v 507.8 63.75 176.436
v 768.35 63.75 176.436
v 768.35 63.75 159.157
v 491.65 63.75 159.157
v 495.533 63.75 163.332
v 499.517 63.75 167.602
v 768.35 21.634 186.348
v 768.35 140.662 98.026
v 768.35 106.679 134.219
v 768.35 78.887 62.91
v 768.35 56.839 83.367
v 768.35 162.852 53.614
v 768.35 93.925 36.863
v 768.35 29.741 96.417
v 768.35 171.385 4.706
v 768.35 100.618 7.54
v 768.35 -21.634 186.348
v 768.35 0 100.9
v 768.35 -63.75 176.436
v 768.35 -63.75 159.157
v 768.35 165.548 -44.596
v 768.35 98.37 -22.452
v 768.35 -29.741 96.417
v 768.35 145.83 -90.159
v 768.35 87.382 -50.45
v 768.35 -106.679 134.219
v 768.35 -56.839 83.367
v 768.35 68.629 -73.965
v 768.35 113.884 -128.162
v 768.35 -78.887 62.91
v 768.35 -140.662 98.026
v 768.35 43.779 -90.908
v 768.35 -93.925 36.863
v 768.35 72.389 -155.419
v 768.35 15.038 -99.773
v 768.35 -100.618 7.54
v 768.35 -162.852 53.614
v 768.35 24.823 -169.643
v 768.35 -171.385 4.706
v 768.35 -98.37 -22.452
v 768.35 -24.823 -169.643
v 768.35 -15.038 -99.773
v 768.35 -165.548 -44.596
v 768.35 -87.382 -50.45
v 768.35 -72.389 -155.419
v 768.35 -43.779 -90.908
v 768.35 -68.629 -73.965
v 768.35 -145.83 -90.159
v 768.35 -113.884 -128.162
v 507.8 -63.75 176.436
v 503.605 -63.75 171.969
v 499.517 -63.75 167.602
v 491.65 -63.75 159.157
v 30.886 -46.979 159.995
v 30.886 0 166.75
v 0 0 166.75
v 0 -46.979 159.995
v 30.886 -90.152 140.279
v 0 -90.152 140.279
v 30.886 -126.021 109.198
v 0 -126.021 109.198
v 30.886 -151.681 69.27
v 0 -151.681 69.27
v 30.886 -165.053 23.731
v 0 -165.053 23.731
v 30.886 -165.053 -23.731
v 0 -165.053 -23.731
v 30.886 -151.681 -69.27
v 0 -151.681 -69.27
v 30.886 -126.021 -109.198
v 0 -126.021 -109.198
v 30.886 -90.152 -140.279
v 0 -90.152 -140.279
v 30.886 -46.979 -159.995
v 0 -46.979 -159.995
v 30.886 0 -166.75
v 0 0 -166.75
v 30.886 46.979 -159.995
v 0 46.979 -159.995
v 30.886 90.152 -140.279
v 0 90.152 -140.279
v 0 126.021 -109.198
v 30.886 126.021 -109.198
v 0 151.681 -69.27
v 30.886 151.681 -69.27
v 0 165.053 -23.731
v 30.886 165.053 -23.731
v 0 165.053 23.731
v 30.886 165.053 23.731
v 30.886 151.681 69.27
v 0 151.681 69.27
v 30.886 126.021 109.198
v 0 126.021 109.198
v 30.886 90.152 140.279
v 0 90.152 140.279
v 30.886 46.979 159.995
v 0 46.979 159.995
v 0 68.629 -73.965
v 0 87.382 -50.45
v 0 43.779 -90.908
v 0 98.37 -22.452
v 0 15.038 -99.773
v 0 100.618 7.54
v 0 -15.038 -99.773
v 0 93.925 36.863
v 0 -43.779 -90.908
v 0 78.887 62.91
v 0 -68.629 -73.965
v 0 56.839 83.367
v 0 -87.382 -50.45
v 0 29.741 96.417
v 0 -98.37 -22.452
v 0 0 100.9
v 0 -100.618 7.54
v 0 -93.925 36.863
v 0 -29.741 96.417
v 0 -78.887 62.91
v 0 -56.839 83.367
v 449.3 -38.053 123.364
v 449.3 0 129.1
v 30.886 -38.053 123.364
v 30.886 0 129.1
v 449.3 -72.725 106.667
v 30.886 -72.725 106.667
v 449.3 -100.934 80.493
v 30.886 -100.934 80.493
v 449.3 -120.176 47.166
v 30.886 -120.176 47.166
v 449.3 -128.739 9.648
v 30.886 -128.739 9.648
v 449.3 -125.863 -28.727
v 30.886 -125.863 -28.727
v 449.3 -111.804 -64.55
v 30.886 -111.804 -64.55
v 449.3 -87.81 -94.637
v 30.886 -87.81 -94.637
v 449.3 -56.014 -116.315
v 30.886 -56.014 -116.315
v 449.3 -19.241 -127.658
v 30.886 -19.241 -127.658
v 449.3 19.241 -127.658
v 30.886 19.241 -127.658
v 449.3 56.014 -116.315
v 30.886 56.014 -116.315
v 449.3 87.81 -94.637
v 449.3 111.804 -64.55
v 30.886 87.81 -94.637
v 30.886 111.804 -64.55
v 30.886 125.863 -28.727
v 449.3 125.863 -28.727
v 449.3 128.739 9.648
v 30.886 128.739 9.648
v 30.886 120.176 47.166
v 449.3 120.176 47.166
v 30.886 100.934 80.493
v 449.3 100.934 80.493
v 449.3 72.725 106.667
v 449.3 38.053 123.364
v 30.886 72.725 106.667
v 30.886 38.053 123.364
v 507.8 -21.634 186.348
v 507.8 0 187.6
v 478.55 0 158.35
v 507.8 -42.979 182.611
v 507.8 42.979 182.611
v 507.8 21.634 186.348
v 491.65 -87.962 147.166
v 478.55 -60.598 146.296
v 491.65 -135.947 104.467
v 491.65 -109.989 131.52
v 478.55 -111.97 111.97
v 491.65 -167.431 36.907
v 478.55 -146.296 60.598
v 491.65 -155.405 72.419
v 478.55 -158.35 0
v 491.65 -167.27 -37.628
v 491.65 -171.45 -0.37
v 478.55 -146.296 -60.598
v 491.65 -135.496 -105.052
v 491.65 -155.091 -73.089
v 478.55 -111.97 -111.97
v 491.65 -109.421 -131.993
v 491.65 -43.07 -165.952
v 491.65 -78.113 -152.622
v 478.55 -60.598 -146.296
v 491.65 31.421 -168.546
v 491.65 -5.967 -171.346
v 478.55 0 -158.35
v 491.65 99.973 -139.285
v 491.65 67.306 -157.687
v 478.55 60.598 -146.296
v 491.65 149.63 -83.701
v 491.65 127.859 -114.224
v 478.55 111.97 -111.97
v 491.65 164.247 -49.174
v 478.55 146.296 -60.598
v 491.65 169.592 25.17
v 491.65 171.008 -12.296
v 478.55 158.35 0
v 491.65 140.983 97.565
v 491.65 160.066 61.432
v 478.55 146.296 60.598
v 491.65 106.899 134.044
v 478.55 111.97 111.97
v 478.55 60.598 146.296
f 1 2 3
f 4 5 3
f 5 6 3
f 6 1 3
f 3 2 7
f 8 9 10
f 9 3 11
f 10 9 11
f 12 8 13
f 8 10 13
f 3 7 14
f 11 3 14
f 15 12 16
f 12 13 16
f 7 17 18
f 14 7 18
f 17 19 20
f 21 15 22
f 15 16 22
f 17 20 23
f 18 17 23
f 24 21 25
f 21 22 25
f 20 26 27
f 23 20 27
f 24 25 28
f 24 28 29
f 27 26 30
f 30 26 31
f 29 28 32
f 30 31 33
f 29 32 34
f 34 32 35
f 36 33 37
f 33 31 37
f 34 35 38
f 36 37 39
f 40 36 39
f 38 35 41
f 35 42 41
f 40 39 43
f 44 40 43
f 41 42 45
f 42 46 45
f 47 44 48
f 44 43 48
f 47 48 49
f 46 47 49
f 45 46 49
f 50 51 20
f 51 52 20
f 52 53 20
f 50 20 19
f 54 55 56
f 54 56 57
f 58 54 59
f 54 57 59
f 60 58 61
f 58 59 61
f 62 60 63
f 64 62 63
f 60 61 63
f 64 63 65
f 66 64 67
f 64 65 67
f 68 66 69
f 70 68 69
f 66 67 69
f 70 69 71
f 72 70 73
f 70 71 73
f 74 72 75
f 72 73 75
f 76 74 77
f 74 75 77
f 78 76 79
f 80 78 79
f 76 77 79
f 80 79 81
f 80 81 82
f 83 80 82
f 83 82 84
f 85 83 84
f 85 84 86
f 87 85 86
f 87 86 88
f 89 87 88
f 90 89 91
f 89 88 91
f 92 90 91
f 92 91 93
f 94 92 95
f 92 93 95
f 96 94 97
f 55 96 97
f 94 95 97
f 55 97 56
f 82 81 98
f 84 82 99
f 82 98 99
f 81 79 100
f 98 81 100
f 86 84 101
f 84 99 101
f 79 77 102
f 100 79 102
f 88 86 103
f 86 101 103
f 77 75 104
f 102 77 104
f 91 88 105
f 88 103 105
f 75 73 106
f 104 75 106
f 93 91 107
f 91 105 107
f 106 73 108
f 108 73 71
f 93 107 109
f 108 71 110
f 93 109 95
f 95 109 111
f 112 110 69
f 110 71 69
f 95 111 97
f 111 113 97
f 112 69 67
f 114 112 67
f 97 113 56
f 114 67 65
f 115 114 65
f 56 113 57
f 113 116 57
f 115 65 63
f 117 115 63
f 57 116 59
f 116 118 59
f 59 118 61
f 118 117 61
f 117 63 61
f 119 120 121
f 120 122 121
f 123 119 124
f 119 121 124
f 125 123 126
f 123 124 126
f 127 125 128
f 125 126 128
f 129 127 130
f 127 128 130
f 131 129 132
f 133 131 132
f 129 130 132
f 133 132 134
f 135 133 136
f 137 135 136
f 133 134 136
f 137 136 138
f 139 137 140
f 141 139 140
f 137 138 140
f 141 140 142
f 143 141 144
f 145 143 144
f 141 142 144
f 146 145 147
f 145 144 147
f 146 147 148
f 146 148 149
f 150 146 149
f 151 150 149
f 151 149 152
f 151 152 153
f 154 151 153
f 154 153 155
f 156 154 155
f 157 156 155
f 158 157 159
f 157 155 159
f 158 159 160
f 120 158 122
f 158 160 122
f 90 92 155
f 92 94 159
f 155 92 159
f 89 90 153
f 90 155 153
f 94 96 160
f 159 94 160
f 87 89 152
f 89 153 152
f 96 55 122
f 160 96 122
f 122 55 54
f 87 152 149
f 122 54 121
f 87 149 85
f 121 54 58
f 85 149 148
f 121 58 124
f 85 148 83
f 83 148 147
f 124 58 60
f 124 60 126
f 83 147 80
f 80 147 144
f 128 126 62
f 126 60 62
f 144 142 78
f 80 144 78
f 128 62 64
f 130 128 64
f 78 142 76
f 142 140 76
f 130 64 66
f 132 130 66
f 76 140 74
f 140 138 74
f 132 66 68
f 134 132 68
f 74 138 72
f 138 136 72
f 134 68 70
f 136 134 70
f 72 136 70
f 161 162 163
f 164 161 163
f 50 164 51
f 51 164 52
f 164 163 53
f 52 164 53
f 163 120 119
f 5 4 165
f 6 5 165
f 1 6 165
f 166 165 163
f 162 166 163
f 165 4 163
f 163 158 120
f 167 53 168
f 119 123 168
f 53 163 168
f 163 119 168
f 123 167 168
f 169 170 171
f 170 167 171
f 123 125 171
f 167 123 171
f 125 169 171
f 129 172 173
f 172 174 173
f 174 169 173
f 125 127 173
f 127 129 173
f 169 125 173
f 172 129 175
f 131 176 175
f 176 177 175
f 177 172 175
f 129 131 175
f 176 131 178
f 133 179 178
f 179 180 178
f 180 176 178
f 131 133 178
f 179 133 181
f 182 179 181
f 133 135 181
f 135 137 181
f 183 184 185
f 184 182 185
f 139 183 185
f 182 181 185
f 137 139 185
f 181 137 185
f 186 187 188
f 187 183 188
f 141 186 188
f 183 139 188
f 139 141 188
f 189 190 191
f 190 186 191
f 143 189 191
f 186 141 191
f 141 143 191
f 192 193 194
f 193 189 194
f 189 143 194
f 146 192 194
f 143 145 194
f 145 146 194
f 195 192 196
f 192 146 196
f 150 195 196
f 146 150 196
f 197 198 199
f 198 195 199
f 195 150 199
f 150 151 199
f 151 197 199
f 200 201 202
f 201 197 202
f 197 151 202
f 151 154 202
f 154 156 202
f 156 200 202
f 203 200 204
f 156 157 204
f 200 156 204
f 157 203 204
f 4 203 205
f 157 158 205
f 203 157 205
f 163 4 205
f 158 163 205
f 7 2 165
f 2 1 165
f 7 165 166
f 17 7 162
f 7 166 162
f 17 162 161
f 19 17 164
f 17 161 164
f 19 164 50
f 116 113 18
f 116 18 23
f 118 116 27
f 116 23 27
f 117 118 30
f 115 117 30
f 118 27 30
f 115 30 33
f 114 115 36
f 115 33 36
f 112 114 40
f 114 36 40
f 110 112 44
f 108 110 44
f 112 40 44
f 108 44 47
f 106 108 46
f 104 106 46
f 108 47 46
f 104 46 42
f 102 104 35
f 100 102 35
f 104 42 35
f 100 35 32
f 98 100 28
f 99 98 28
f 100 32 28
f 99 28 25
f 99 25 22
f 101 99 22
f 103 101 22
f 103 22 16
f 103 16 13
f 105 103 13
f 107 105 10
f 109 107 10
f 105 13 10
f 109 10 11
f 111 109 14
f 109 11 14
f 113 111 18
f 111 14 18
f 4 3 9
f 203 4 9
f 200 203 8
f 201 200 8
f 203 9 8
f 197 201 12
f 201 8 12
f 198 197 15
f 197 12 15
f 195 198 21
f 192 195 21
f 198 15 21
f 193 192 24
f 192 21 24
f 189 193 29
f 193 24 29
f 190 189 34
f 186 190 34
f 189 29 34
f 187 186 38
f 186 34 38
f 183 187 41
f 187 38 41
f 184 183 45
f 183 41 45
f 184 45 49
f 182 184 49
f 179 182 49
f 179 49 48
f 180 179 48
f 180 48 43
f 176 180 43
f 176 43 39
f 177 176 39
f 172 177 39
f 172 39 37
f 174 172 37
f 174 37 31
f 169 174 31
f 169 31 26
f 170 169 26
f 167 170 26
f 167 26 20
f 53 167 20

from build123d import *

# Parameters (mm, degrees)
F2_R     = 205.006654
F3_DEPTH = 350


with BuildPart() as f1:
    # F0 (on Front) → F1 (revolve)
    with BuildSketch(Plane.XZ):
        Polygon((30.885566, 166.75), (0, 166.75), (0, 100.9), (768.35, 100.9), (768.35, 187.6), (507.8, 187.6), (449.3, 129.1), (30.885566, 129.1), align=None)
    revolve(axis=Axis((384.175, 0, 0), (1, 0, 0)))

    # F2 (on face) → F3 (cut)
    with BuildSketch(Plane.YZ.offset(768.35)):
        Circle(F2_R)
        with BuildLine():
            ThreePointArc((187.6, 0), (-107.782791, -153.546833), (-63.75, 176.4361))
            Line((-63.75, 176.4361), (-63.75, 178.985858))
            ThreePointArc((-63.75, 178.985858), (0, 190), (63.75, 178.985858))
            Line((63.75, 178.985858), (63.75, 176.4361))
            ThreePointArc((63.75, 176.4361), (153.546833, 107.782791), (187.6, 0))
        make_face(mode=Mode.SUBTRACT)
        with BuildLine():
            ThreePointArc((63.75, 159.157281), (0, -171.45), (-63.75, 159.157281))
            Line((-63.75, 159.157281), (-63.75, 176.4361))
            ThreePointArc((-63.75, 176.4361), (-107.782791, -153.546833), (187.6, 0))
            ThreePointArc((187.6, 0), (153.546833, 107.782791), (63.75, 176.4361))
            Line((63.75, 176.4361), (63.75, 159.157281))
        make_face()
    extrude(amount=-F3_DEPTH, mode=Mode.SUBTRACT)


solid = f1.part
